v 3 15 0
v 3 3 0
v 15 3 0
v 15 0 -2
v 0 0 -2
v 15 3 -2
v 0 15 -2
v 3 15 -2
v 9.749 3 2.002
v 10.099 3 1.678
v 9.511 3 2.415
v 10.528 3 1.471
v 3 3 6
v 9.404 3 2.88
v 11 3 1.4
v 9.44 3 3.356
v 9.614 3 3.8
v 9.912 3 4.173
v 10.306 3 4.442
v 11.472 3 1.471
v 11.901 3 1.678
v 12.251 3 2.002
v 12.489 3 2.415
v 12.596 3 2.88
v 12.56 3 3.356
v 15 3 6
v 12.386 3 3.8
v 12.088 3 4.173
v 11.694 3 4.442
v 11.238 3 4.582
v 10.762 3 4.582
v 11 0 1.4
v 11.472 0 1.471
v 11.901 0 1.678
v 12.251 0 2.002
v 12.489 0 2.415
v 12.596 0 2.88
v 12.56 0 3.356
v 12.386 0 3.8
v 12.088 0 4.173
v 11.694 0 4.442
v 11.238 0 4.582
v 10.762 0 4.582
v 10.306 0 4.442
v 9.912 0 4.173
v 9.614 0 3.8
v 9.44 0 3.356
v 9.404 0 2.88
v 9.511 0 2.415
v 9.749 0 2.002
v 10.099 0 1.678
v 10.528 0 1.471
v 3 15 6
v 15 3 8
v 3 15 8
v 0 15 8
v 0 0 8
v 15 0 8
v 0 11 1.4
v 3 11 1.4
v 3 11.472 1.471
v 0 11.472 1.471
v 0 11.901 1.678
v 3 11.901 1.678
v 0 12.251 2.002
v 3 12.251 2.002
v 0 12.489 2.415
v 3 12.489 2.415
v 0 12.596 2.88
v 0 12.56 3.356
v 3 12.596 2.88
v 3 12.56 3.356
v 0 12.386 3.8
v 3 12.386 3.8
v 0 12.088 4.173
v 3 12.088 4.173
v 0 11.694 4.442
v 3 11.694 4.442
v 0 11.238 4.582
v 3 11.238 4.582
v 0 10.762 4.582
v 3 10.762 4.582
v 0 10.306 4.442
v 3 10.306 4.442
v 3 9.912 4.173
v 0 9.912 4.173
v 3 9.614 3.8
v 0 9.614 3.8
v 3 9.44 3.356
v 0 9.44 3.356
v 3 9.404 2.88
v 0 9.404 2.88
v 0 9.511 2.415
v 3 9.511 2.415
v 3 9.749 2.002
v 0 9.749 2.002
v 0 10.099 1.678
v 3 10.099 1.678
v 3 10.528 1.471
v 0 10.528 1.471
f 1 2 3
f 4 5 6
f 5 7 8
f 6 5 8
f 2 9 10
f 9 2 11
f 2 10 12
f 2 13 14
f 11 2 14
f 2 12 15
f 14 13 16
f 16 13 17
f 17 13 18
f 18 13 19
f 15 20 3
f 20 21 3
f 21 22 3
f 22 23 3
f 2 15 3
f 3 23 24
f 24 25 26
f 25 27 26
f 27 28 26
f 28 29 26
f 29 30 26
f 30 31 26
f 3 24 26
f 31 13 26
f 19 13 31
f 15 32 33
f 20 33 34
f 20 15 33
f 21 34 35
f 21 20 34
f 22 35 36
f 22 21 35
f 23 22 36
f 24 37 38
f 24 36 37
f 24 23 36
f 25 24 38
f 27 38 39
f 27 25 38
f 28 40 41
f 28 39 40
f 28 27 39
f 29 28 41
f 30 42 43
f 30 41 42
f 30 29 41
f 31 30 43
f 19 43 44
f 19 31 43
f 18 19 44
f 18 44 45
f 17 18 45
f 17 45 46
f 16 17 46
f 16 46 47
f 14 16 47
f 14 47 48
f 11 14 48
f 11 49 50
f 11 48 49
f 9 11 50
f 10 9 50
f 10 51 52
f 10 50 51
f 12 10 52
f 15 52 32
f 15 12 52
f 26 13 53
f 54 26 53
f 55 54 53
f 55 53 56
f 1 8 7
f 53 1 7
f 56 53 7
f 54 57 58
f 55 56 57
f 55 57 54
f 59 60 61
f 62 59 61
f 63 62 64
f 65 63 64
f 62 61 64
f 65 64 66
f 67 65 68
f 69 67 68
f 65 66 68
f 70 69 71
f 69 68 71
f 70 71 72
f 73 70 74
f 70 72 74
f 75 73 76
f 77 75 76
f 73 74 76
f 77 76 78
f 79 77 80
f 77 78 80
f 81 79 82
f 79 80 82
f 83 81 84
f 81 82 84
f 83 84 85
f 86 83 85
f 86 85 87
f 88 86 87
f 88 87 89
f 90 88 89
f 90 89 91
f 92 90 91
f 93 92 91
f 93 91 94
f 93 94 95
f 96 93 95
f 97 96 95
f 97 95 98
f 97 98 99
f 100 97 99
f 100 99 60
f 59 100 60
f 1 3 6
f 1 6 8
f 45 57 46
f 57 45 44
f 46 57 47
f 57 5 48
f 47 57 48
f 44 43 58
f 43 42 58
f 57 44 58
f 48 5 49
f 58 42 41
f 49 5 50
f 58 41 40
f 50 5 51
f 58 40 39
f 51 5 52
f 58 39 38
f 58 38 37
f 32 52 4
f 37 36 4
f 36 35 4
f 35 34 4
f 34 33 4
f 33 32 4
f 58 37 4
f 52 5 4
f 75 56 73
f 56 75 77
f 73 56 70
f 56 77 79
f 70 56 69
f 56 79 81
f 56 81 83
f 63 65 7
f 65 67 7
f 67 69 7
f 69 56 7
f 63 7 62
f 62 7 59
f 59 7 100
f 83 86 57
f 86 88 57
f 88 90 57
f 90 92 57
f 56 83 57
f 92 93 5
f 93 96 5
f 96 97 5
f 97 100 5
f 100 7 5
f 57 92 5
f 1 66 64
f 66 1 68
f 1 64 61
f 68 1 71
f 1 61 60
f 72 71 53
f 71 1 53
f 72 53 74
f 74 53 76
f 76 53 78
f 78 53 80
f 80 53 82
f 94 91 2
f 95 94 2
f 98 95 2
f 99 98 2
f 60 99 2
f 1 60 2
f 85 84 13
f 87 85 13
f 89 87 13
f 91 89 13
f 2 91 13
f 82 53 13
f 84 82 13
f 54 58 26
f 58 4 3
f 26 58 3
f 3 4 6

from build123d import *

# Parameters (mm, degrees)
BOSS_EXTRUDE1_DEPTH = 3
BOSS_EXTRUDE3_DEPTH = 2
SKETCH2_R           = 1.6
CUT_EXTRUDE1_DEPTH  = 21.808652047


with BuildPart() as part:
    # Sketch1 → Boss-Extrude1 (new body)
    with BuildSketch(Plane.XY):
        Polygon((0, 0), (15, 0), (15, 3), (3, 3), (3, 15), (0, 15), align=None)
    extrude(amount=BOSS_EXTRUDE1_DEPTH)

    # Sketch1<4> → Boss-Extrude3 (add)
    with BuildSketch(Plane.XY):
        Polygon((0, 0), (15, 0), (15, 3), (3, 15), (0, 15), align=None)
    extrude(amount=-BOSS_EXTRUDE3_DEPTH)

    # Mirror1: part across plane


with BuildPart() as part_1:
    add(part.part)
    add(part.part.mirror(Plane.XY.offset(3)))

    # Sketch2 → Cut-Extrude1 (cut, through all)
    with BuildSketch(Plane(origin=(3, 0, 0), x_dir=(0, 0, -1), z_dir=(1, 0, 0))):
        with Locations((-3, 11)):
            Circle(SKETCH2_R)
    cut_extrude1 = extrude(amount=-CUT_EXTRUDE1_DEPTH, mode=Mode.SUBTRACT)

    # Mirror2: Cut-Extrude1 across plane
    add(cut_extrude1.mirror(Plane(origin=(0, 0, 0), x_dir=(0, 0, 1), z_dir=(0.7071067811865517, -0.7071067811865436, 0))), mode=Mode.SUBTRACT)


solid = part_1.part
